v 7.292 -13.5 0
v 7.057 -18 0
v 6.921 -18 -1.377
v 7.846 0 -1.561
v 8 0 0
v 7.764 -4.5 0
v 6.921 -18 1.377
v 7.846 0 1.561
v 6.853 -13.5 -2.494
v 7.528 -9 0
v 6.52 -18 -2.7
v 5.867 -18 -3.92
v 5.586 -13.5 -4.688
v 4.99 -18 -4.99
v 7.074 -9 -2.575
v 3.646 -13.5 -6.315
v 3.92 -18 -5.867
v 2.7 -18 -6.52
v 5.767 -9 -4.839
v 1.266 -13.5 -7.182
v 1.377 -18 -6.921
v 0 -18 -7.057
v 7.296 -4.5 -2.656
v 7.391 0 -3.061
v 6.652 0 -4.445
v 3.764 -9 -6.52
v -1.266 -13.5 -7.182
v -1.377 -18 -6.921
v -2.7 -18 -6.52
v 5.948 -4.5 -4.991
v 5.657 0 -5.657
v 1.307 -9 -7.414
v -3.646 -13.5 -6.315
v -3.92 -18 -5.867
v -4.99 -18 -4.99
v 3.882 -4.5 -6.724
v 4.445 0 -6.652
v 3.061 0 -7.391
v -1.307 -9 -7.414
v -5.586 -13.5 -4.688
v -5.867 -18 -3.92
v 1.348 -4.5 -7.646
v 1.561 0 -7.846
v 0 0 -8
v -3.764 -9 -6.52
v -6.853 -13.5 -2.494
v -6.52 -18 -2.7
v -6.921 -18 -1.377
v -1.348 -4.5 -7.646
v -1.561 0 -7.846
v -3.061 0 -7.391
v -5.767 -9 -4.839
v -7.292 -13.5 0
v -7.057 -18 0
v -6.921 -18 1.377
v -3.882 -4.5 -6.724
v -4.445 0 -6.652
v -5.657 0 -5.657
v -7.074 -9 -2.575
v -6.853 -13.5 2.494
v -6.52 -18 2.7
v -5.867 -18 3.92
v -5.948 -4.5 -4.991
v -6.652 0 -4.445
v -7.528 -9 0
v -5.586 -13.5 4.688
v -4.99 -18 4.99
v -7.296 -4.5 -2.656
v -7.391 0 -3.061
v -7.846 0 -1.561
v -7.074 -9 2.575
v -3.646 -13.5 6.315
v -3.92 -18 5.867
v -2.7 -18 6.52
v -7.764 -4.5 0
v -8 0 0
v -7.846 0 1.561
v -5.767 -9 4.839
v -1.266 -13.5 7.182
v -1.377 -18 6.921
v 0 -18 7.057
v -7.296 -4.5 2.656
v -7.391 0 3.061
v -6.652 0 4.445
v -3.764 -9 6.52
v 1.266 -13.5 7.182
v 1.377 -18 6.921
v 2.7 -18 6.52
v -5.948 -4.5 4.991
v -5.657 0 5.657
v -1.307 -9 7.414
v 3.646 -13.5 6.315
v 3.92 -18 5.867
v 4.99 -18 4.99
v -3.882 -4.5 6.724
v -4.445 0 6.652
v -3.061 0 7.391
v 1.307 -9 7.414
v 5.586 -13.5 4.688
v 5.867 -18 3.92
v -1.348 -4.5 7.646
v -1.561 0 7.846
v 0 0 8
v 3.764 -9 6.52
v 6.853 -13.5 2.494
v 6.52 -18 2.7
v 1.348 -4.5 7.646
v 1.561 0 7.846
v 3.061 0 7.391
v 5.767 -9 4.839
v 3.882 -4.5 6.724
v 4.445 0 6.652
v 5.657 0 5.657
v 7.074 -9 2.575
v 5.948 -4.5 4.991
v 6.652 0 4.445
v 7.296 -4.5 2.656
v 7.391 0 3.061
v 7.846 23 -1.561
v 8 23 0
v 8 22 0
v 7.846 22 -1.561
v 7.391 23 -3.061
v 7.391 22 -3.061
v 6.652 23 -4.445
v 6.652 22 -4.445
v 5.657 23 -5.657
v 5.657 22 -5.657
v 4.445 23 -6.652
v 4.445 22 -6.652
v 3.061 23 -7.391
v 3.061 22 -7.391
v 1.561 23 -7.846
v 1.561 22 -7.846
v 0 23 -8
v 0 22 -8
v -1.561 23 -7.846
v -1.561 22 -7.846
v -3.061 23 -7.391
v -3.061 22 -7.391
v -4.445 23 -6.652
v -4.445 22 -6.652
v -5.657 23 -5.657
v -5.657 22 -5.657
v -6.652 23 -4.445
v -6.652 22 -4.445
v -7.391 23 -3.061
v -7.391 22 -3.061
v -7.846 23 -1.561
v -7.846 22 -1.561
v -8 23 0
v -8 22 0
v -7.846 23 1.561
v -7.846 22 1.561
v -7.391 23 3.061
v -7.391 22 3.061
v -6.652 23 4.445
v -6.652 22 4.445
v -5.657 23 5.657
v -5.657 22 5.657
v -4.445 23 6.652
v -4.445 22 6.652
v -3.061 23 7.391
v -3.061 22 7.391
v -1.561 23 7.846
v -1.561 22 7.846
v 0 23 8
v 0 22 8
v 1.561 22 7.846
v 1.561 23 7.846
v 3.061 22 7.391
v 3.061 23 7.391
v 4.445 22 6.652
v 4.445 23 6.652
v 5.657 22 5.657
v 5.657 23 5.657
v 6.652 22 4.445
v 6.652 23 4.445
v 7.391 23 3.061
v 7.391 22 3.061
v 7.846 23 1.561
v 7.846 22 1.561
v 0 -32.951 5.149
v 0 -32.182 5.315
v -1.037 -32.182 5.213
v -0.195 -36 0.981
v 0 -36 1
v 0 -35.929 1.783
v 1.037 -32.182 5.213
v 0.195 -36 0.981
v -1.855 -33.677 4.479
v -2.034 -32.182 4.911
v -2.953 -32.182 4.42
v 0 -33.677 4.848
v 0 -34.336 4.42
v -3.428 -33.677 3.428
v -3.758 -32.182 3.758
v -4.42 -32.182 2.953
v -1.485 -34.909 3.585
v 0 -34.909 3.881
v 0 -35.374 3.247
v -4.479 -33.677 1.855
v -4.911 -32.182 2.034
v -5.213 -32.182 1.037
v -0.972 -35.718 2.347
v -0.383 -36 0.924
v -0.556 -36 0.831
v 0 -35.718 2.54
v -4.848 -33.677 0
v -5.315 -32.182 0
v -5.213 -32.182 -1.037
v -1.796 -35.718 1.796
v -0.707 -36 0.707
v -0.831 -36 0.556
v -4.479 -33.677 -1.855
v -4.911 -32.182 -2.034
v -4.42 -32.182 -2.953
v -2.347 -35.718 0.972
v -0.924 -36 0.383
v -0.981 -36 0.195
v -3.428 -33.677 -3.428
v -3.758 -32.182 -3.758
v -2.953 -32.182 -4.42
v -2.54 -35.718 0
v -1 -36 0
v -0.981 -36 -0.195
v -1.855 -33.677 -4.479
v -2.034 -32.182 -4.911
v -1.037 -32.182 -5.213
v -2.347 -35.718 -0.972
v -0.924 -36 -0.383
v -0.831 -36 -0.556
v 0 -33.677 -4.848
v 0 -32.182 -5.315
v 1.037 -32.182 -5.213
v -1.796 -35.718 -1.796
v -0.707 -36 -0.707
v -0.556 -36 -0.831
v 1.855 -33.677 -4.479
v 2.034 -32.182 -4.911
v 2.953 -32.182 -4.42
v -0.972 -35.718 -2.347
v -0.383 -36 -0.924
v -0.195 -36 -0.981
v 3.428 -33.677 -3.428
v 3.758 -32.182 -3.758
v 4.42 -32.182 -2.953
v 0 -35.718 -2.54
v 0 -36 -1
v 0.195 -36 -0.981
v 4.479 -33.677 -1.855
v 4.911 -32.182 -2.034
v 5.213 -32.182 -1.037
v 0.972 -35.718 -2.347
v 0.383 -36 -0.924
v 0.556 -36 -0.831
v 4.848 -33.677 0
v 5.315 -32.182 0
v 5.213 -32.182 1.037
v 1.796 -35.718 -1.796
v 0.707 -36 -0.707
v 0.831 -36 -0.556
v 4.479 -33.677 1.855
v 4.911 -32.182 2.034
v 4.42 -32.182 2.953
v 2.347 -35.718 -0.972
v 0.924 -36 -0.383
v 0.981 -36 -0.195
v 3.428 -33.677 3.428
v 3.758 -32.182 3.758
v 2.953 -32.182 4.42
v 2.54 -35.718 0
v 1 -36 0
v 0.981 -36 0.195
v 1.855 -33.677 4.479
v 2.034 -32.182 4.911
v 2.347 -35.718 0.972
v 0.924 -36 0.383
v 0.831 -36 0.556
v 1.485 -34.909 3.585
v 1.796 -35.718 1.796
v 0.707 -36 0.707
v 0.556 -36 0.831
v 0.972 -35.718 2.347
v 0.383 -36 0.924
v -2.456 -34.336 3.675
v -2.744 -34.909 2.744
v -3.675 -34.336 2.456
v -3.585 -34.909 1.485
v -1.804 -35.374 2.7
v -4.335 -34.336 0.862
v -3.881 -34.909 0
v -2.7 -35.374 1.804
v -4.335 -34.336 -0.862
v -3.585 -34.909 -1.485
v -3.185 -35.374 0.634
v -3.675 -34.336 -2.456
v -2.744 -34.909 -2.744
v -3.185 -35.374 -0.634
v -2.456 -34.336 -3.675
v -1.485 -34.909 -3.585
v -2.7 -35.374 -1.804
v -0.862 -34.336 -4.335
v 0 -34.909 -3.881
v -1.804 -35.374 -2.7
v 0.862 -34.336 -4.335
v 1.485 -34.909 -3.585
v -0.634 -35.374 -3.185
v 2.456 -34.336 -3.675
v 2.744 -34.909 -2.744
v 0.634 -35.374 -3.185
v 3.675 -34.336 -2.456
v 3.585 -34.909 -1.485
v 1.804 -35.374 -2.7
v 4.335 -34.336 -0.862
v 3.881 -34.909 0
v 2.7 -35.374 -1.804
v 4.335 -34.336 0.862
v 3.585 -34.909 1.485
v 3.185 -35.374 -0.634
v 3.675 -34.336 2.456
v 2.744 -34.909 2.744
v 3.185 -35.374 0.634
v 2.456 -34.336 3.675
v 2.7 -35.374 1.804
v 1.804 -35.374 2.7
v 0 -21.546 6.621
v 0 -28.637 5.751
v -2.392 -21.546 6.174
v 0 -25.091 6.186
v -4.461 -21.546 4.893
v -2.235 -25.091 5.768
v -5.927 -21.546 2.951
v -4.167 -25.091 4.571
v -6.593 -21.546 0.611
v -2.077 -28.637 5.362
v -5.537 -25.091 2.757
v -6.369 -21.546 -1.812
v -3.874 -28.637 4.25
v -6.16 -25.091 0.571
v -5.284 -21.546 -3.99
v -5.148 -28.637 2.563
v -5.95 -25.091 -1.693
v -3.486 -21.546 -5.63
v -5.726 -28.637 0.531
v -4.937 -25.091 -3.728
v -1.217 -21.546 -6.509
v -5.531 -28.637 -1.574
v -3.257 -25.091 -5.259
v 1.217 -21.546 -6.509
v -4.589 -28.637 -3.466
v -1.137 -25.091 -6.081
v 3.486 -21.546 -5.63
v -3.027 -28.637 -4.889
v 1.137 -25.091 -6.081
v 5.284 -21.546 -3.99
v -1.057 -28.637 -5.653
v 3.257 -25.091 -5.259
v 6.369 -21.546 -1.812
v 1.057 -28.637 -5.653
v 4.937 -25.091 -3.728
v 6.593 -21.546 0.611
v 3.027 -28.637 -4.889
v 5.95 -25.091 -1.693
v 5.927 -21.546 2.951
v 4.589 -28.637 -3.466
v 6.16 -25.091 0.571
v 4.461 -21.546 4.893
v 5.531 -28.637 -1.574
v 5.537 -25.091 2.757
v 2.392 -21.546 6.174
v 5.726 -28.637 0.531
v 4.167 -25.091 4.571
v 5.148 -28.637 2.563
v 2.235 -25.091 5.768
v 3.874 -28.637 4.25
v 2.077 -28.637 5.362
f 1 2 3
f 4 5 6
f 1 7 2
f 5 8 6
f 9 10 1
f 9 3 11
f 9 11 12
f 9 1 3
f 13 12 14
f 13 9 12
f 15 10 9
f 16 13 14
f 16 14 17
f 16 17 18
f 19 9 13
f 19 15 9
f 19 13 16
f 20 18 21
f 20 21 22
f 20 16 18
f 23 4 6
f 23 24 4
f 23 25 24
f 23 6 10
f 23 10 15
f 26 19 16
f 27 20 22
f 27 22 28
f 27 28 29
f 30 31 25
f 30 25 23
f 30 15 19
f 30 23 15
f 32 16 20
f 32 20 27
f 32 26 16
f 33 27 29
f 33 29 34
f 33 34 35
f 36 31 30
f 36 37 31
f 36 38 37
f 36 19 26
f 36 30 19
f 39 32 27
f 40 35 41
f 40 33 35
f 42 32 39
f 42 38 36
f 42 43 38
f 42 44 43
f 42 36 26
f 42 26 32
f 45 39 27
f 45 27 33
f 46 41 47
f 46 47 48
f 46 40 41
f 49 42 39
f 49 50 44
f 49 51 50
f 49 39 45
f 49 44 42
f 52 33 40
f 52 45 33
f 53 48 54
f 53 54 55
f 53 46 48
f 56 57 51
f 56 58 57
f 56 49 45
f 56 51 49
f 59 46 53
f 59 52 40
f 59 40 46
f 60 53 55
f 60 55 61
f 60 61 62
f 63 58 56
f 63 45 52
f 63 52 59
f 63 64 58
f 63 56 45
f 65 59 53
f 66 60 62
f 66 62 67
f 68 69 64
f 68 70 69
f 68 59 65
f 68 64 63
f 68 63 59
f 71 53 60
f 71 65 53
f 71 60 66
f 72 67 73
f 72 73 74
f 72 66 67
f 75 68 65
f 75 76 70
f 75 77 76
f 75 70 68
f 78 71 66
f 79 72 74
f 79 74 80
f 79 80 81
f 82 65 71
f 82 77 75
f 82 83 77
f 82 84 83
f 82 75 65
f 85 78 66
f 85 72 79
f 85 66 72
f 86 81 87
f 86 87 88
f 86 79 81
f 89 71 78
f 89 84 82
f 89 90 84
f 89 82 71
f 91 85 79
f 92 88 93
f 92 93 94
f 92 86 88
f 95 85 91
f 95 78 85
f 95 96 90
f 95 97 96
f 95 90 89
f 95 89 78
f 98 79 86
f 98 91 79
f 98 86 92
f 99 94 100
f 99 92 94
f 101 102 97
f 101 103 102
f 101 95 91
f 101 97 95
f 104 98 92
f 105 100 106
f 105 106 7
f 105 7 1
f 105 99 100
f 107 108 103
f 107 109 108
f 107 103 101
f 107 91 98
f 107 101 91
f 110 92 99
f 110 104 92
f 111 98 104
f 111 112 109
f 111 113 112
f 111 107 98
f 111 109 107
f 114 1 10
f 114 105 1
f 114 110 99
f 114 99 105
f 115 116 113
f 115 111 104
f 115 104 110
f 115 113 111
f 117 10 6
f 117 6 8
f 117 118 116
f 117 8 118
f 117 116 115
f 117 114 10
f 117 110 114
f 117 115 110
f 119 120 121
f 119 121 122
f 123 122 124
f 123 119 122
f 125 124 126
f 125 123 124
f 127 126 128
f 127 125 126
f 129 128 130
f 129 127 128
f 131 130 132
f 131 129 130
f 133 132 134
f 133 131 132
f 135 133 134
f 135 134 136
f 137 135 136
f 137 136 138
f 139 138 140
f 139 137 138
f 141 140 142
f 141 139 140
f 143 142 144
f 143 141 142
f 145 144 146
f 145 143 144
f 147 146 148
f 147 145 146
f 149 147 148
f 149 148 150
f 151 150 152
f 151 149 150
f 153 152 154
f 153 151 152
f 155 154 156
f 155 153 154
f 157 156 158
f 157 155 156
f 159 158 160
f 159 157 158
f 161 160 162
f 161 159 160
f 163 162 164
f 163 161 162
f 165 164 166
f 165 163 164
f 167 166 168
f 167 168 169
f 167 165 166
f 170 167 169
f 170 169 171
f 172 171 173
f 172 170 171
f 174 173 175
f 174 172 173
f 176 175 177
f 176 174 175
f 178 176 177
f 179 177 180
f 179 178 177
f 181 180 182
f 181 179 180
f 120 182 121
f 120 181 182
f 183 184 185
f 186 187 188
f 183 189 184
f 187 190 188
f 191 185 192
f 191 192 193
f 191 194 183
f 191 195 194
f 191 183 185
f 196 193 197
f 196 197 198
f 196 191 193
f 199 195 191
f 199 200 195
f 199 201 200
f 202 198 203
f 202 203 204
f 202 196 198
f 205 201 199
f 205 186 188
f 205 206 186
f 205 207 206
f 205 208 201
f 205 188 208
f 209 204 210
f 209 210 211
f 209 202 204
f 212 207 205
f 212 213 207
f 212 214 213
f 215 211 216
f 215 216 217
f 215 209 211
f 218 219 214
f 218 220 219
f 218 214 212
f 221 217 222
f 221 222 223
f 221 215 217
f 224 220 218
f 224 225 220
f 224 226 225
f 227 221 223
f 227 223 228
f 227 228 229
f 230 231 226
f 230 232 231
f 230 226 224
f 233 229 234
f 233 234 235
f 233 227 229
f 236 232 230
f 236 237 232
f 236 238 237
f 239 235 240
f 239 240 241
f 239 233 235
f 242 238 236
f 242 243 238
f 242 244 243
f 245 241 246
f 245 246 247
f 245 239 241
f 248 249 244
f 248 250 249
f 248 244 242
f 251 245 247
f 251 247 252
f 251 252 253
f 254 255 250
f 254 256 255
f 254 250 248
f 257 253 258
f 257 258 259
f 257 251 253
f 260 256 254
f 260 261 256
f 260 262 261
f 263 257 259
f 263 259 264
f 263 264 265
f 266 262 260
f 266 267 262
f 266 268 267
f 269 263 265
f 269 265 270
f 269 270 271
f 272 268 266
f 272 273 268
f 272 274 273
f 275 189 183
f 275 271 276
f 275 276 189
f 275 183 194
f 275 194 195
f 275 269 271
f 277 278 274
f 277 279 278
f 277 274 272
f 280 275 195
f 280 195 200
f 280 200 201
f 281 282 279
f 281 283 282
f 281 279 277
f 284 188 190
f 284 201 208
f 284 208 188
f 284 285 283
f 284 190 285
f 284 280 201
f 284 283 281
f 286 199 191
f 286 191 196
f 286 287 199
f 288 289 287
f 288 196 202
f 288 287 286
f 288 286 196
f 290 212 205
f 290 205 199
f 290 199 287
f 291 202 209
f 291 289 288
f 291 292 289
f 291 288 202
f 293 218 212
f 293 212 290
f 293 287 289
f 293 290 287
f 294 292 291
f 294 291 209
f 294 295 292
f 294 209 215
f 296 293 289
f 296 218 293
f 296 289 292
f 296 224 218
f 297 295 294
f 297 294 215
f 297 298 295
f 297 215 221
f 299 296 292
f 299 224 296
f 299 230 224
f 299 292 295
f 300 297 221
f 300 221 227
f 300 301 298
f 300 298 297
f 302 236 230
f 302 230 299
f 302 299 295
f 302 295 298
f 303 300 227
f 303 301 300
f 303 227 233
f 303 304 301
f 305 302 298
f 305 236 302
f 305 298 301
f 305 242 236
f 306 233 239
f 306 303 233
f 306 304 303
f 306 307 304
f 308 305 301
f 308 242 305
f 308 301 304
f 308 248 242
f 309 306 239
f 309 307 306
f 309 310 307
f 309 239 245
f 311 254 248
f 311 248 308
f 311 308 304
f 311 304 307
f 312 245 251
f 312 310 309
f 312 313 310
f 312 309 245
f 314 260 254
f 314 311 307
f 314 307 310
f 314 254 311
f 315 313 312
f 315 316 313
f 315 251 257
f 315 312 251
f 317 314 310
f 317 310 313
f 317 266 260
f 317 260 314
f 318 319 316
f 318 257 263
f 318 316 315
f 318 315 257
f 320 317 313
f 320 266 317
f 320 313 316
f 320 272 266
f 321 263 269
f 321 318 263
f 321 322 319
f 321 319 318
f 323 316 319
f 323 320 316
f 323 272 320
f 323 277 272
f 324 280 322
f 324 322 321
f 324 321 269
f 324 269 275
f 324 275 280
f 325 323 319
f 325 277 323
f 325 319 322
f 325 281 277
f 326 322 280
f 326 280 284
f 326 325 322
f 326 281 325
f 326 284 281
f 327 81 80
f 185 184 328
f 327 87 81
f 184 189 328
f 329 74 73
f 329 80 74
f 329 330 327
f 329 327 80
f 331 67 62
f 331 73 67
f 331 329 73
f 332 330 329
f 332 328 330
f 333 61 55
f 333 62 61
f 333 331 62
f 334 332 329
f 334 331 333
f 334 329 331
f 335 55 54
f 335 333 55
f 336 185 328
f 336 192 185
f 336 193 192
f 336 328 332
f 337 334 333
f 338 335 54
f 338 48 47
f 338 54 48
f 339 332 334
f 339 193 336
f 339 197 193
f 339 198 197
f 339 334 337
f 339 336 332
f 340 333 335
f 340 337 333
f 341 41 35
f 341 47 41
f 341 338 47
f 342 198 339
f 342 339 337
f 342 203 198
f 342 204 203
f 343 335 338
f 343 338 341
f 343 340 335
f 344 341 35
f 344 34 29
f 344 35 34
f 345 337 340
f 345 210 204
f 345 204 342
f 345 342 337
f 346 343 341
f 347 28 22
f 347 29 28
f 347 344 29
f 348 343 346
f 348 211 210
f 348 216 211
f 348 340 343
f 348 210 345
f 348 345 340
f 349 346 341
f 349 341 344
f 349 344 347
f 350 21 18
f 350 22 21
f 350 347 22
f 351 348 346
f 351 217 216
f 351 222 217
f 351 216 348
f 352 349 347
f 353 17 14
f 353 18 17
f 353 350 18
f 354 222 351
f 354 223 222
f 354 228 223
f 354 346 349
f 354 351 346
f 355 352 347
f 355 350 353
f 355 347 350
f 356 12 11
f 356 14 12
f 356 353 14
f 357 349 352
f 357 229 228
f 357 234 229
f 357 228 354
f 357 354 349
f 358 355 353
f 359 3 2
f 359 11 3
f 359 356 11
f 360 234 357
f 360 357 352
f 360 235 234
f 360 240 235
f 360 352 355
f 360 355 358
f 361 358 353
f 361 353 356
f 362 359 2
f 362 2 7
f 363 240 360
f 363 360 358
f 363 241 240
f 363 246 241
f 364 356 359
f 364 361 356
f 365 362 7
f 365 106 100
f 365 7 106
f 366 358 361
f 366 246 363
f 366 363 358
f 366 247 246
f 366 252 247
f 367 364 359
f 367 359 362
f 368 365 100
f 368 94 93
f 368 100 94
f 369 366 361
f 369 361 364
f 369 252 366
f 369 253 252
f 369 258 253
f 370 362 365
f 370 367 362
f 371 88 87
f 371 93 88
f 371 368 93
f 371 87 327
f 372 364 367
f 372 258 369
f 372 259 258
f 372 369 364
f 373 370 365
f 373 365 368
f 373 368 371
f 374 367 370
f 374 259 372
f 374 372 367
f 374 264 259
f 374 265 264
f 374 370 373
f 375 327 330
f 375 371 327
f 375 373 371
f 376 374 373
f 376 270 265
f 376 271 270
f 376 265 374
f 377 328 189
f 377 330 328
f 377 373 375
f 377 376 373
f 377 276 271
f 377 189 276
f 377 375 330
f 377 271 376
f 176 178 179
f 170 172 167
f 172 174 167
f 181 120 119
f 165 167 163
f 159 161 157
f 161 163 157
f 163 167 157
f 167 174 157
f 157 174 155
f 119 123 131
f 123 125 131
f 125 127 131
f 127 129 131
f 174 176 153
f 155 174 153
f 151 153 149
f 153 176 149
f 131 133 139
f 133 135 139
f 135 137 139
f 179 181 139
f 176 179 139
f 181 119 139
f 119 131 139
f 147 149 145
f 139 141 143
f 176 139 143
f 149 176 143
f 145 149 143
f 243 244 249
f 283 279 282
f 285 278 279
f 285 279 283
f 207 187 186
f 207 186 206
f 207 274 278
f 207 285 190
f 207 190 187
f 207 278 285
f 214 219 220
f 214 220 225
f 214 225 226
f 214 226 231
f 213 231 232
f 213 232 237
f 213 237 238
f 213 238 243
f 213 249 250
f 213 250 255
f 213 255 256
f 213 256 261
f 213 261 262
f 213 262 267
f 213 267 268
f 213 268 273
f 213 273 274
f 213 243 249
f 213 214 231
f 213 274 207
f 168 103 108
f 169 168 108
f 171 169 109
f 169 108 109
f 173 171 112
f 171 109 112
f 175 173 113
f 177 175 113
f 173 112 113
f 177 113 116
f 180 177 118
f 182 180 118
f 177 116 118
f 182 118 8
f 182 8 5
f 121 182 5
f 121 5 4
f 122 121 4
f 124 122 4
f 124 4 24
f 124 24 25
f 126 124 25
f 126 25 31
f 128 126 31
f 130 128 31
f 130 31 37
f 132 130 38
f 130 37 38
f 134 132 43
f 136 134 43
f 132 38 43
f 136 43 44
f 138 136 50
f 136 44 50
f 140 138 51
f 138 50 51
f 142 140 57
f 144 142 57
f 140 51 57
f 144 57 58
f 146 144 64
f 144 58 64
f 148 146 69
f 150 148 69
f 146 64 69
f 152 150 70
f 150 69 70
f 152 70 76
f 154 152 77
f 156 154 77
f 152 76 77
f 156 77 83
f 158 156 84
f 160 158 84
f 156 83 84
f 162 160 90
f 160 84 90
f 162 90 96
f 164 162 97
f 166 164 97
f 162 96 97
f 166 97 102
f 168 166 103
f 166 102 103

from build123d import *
from build123d.topology import SkipClean

# Parameters (mm, degrees)
SKETCH_608_R        = 8
EXTRUDE_1_DEPTH     = 22
EXTRUDE_2_OUTLINE_W = 8
EXTRUDE_2_OUTLINE_H = 1


# Read off the part's stored shape, not the designer's step: 凸台-拉伸2
with BuildPart() as part:
    # Sketch 608 → 凸台-拉伸1 (new body)
    with BuildSketch(Plane(origin=(0, 0, 0), x_dir=(1, 0, 0), z_dir=(0, 1, 0))):
        with Locations(Location((0, 0, 0), (0, 0, 270))):
            Circle(SKETCH_608_R)
    extrude(amount=EXTRUDE_1_DEPTH)

    # 凸台-拉伸2 outline → 凸台-拉伸2 (revolve)
    with SkipClean():  # the faces are left unmerged after this step: merging them gives an invalid solid
        with BuildSketch(Plane.XY):
            with Locations((4, 22.5)):
                Rectangle(EXTRUDE_2_OUTLINE_W, EXTRUDE_2_OUTLINE_H)
            Polygon((8, 0), (0, 0), (0, -18), (7.056659973, -18), align=None)
        revolve(axis=Axis((0, 0, 0), (0, 1, 0)))
    add(part.part.scale(1), mode=Mode.REPLACE)  # the faces are merged on a copy

    # 草图7 → 旋转4 (revolve)
    with BuildSketch(Plane.XY, mode=Mode.PRIVATE) as revolve_4_sk:
        with BuildLine():
            Line((0, -18), (7.056659973, -18))
            Line((7.056659973, -18), (5.315312922, -32.182133633))
            ThreePointArc((5.315312922, -32.182133633), (3.880886548, -34.908529724), (1, -36))
            Line((1, -36), (0, -36))
            Line((0, -36), (0, -18))
        make_face()
    revolve(revolve_4_sk.sketch.rotate(Axis((0, -18, 0), (0, -1, 0)), 90), axis=Axis((0, -18, 0), (0, -1, 0)))


solid = part.part
